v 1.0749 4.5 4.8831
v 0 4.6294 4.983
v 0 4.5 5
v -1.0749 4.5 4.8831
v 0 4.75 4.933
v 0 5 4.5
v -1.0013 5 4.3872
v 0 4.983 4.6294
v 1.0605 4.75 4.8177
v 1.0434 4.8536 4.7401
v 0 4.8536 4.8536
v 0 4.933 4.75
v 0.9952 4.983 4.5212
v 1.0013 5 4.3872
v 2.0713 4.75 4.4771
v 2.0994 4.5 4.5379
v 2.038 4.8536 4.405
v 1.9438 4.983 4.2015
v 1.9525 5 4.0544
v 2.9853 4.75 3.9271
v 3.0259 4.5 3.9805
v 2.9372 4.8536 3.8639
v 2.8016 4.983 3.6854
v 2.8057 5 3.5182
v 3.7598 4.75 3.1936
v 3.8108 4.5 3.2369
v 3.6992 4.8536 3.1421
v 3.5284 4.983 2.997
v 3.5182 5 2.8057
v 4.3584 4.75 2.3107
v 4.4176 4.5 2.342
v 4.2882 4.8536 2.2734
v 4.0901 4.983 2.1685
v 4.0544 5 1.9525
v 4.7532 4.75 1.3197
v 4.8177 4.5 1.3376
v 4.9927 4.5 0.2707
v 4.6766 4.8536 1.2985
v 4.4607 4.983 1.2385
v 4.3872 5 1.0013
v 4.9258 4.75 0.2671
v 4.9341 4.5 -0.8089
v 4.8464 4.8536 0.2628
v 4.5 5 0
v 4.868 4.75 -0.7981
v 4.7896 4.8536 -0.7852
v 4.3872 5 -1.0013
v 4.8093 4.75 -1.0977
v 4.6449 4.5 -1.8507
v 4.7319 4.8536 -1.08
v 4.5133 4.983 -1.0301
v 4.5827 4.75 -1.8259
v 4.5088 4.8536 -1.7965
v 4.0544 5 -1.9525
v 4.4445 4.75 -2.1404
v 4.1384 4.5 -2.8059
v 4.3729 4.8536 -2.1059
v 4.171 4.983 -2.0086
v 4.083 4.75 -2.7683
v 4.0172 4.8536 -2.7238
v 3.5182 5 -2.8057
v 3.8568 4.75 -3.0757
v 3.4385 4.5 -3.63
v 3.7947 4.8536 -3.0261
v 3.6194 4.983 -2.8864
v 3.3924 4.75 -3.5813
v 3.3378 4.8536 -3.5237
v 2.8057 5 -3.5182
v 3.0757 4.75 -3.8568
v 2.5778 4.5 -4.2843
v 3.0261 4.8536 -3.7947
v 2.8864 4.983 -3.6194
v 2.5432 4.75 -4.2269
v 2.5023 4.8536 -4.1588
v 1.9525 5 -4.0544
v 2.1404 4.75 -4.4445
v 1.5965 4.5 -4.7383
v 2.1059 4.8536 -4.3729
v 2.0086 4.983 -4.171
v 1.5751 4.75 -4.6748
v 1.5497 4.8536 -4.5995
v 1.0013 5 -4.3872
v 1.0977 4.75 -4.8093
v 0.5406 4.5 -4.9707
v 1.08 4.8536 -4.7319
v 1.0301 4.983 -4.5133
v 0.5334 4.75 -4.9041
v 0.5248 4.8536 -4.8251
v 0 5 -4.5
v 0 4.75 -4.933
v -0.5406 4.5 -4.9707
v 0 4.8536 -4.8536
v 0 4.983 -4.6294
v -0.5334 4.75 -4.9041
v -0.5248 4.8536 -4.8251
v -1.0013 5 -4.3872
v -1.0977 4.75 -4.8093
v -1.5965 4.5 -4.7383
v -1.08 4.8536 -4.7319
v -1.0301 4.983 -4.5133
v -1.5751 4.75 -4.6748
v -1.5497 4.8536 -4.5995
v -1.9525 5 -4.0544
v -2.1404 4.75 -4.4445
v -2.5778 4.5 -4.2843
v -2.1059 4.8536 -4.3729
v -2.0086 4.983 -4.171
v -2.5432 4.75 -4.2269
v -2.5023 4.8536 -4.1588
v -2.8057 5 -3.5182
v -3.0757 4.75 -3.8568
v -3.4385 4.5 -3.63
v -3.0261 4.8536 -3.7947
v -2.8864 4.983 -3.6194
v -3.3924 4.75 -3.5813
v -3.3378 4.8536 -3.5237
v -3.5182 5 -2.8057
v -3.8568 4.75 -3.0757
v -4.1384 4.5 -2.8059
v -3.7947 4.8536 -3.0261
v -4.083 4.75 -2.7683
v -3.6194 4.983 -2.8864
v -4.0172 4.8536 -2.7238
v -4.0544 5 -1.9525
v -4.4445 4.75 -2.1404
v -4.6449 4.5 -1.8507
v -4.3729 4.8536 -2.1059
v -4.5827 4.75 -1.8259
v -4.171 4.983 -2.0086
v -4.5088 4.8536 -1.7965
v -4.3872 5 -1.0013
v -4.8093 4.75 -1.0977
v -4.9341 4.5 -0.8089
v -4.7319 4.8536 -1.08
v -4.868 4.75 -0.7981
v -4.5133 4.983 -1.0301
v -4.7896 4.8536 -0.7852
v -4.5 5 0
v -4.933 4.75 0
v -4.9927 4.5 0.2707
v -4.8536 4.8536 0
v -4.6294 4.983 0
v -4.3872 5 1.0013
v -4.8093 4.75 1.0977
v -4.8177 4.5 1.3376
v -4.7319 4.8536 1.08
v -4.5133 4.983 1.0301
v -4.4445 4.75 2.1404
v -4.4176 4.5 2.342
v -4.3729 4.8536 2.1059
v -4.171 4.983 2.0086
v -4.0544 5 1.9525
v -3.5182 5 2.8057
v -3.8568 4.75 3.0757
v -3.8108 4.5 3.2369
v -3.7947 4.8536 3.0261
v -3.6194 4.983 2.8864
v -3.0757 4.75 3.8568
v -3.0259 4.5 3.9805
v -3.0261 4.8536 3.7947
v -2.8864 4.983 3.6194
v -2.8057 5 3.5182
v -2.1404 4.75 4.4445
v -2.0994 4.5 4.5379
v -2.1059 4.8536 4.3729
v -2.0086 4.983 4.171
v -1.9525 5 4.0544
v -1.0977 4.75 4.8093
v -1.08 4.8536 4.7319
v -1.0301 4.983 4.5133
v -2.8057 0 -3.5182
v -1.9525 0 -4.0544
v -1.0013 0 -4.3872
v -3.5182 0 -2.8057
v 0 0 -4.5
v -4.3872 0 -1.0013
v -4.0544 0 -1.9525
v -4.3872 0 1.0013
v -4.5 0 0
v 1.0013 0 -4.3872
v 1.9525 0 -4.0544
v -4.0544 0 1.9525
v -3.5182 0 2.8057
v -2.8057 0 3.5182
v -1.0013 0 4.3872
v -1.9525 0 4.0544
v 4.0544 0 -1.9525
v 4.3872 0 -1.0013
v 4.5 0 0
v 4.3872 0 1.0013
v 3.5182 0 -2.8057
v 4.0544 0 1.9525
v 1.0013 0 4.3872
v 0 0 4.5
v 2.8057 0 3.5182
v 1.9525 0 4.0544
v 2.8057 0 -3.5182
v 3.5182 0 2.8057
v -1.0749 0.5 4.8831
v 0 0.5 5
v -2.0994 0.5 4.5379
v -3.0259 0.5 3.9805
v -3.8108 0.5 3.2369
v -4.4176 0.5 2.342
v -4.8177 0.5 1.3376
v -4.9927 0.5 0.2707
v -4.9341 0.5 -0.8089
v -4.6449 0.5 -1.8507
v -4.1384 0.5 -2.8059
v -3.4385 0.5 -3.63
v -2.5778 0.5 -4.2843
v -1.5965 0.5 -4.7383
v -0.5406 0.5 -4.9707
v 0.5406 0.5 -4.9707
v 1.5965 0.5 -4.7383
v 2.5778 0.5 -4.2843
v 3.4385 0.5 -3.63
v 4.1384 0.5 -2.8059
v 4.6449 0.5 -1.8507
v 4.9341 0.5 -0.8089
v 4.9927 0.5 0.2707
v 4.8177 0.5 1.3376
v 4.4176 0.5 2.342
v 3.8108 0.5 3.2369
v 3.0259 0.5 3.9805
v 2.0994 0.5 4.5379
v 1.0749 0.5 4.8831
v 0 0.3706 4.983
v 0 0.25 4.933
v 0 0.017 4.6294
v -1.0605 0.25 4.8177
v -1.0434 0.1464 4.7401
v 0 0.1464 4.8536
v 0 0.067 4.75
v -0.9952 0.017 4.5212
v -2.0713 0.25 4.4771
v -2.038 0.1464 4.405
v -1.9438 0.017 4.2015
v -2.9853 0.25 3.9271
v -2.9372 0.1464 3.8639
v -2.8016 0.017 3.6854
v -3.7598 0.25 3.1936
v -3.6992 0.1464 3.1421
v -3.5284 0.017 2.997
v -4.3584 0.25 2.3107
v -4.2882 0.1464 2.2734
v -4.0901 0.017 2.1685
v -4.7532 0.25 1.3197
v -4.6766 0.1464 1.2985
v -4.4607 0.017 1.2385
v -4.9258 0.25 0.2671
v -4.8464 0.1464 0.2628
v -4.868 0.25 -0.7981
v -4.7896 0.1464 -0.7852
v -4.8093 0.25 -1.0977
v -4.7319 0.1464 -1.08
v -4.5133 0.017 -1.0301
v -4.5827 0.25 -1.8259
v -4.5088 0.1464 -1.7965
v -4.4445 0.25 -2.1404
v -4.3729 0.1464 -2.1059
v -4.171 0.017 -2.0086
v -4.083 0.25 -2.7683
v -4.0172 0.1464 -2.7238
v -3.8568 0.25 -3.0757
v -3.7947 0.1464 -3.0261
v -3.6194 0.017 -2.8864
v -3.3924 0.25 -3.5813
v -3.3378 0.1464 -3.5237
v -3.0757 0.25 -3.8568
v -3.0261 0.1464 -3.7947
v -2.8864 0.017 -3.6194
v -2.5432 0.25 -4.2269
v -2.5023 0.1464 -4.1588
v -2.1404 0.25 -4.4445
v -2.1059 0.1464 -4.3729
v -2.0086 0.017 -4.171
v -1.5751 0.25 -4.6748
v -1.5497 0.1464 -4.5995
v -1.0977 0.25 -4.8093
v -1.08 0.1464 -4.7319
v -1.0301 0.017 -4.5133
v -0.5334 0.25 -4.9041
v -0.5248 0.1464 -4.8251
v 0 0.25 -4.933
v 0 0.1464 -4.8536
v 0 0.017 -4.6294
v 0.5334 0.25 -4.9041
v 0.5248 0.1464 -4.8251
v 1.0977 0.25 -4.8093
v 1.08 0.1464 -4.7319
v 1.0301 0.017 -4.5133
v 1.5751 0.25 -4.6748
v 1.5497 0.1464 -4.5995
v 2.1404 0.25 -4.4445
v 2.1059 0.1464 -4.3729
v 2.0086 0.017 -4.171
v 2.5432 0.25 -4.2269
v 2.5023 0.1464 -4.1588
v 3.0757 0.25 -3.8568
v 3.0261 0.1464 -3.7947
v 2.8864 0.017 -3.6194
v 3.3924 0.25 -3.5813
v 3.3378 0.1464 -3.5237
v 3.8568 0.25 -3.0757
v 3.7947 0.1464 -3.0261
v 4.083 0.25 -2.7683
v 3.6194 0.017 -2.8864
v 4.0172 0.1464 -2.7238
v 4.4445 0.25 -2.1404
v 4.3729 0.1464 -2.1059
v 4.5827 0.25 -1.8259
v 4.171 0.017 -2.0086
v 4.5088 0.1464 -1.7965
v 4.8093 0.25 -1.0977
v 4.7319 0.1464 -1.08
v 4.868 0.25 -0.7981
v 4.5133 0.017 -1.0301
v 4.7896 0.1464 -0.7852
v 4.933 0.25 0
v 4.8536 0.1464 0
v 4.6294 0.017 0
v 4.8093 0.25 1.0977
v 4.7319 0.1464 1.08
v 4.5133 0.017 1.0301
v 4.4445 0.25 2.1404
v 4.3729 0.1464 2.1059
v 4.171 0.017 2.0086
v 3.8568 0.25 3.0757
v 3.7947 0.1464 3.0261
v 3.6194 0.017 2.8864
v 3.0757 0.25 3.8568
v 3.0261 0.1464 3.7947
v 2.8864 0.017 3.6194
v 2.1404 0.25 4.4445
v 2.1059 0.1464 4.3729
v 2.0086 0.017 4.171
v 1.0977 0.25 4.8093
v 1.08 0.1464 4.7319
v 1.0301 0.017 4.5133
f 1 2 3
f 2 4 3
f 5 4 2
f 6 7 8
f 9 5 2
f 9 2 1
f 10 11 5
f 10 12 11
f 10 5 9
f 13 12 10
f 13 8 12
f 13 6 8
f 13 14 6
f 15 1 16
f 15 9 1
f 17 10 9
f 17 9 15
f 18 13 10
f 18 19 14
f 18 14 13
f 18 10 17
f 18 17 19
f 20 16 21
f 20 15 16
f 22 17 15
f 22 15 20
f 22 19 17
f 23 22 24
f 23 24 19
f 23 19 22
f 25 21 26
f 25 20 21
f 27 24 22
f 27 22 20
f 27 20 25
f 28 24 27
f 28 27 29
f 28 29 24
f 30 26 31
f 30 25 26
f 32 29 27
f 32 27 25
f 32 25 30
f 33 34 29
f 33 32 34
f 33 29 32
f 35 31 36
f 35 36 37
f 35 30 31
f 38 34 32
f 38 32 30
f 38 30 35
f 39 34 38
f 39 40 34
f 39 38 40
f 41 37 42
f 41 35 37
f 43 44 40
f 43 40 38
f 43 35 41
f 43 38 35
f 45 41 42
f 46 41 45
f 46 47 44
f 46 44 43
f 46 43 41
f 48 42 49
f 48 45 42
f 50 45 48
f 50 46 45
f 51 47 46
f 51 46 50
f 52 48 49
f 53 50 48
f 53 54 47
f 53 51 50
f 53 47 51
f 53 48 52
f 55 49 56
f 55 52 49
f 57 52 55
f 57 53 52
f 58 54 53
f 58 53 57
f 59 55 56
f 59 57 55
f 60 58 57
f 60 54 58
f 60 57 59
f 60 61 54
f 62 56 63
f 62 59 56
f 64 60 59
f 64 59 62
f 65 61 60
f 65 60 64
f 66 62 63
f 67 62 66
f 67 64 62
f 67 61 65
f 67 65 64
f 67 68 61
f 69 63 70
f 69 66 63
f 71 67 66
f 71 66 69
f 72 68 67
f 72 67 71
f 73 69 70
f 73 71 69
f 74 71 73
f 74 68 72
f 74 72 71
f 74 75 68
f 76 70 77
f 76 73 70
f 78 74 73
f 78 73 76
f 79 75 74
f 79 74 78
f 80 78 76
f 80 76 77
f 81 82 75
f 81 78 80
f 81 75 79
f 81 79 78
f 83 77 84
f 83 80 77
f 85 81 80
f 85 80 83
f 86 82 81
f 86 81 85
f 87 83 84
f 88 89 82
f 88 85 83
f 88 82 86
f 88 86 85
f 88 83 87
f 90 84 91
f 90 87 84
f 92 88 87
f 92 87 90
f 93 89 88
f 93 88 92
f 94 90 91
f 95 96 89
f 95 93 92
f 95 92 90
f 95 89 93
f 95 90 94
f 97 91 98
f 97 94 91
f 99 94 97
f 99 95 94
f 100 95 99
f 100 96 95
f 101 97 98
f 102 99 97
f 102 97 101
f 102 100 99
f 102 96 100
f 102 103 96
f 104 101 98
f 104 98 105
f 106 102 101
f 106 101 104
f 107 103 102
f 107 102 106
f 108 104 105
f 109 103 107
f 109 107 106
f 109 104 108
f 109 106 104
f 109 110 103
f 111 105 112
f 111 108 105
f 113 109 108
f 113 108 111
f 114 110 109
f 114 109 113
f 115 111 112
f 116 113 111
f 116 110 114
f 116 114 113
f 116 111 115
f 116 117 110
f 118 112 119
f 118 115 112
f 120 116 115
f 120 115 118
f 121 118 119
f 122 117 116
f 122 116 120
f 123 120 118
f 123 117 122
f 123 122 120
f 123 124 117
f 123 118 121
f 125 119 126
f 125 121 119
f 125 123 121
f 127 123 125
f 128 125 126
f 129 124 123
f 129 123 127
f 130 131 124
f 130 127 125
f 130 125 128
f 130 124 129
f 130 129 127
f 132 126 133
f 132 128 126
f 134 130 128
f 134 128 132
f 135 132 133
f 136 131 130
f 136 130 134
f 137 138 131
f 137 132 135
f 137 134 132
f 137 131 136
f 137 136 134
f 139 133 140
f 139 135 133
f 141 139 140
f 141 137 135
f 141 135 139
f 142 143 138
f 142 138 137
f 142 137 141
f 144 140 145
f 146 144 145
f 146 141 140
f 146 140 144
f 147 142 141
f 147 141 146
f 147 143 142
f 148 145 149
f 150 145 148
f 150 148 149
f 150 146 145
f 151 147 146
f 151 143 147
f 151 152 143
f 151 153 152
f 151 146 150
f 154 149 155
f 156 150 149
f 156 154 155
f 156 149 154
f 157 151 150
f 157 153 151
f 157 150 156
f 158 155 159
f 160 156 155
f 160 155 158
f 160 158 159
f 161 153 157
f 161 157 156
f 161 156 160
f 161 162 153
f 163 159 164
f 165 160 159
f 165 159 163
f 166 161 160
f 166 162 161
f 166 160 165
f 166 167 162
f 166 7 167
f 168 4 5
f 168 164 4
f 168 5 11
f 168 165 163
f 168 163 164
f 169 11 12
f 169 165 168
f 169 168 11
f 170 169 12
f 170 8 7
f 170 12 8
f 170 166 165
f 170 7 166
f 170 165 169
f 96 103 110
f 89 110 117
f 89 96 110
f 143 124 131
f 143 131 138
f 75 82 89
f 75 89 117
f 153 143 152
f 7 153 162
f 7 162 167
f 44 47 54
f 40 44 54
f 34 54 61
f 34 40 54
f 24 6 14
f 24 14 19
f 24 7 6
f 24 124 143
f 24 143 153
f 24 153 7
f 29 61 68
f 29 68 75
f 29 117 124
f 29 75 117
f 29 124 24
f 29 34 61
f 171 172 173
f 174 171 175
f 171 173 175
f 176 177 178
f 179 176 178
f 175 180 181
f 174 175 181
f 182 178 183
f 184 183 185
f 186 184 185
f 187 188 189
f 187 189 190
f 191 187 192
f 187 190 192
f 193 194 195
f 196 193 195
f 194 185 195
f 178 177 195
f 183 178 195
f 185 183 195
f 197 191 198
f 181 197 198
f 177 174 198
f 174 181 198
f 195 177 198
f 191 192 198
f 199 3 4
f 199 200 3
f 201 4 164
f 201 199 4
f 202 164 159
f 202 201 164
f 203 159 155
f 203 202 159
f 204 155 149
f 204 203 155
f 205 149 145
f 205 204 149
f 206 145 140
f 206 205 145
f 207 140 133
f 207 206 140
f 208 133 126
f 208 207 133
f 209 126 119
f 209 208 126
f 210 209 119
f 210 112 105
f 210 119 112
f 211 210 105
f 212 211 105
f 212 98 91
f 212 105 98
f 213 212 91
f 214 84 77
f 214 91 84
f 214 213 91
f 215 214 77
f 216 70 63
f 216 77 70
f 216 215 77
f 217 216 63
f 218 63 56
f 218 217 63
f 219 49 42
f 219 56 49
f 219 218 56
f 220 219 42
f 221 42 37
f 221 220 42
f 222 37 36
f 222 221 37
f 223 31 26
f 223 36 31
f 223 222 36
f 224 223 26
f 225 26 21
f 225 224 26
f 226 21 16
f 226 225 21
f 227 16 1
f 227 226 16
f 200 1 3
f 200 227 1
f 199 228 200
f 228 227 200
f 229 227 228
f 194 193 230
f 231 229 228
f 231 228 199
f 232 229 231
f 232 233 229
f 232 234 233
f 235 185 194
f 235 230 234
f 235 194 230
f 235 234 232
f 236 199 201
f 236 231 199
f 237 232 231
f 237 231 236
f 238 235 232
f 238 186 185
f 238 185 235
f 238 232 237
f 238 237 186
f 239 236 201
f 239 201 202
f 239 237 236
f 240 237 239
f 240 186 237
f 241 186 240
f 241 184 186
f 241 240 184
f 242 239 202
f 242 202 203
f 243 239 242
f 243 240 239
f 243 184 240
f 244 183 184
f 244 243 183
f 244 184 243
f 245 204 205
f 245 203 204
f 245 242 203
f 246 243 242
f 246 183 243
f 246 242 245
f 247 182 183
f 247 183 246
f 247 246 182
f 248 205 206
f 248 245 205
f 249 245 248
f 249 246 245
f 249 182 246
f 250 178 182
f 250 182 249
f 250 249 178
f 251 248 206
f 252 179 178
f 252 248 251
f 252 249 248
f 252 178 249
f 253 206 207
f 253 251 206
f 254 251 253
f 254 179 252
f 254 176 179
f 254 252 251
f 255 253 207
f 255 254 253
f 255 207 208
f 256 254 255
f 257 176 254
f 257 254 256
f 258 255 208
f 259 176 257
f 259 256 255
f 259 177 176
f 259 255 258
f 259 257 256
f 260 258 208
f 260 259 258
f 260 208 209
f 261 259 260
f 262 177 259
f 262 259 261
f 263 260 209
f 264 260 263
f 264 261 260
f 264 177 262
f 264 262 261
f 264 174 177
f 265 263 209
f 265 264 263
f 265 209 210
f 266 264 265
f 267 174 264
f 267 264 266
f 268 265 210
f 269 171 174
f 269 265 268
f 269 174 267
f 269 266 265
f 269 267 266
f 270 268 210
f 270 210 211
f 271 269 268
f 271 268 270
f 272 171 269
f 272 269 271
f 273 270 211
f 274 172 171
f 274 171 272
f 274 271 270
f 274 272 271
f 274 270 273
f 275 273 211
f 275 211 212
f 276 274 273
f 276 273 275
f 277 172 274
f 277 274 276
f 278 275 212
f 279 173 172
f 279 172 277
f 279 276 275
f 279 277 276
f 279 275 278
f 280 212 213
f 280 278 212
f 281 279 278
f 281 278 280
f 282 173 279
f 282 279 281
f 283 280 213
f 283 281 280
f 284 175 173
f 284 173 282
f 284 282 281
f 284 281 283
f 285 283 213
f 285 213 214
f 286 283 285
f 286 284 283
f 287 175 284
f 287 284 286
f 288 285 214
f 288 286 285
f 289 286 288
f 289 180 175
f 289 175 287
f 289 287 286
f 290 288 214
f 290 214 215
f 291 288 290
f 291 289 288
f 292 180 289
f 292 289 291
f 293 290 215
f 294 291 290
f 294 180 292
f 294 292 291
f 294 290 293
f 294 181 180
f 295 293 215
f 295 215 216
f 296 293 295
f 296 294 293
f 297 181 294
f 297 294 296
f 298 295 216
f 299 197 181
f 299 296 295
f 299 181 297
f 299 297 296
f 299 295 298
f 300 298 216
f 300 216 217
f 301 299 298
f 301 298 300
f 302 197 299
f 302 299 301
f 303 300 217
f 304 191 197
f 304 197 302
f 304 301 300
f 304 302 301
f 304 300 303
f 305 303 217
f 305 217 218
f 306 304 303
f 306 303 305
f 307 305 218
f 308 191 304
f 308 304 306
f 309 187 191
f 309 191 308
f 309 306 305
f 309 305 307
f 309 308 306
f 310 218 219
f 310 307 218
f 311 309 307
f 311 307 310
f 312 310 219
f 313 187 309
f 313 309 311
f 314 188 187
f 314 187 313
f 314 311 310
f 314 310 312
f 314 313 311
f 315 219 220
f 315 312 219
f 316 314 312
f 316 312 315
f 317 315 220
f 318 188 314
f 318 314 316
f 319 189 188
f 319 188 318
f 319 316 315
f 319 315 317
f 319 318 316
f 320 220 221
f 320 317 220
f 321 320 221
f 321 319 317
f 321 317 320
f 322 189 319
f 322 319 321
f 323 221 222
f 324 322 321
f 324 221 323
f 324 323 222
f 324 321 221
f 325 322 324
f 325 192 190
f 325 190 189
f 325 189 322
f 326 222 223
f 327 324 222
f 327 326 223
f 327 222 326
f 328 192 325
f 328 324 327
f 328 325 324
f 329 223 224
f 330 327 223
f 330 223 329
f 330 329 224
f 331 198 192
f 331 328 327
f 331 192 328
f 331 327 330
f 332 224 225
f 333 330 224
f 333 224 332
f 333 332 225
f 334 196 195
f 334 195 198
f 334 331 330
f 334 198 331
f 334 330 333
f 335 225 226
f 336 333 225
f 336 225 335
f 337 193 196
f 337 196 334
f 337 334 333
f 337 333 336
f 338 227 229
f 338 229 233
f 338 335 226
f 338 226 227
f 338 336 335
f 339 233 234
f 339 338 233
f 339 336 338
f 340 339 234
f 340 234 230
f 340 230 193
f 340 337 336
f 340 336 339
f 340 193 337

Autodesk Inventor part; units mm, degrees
ref_plane "YZ Plane" through (0, 0, 0) normal (1, 0, 0) x (0, 1, 0)
ref_plane "XZ Plane" through (0, 0, 0) normal (0, 1, 0) x (-1, 0, 0)
ref_plane "XY Plane" through (0, 0, 0) normal (0, 0, 1) x (1, 0, 0)
sketch "Эскиз1" plane through (0, 0, 0) normal (1, 0, 0) x (0, 1, 0)
  line L0 (0, 0) -> (5, 0)
  line L1 (5, 0) -> (5, 5)
  line L2 (5, 5) -> (0, 5)
  line L3 (0, 5) -> (0, 0)
  dimension "d0" = 5
  dimension "d1" = 5
revolve "Вращение1" add sketch "Эскиз1" angle 360 about axis through (0, 0, 0) along (0, 1, 0)
fillet "Сопряжение1" radius 0.5 1 edges at (0, 5, -5)
fillet "Сопряжение2" radius 0.5 1 edges at (0, 0, -5)
properties part number "Магнит2" material "Пластик ПАЭК"
